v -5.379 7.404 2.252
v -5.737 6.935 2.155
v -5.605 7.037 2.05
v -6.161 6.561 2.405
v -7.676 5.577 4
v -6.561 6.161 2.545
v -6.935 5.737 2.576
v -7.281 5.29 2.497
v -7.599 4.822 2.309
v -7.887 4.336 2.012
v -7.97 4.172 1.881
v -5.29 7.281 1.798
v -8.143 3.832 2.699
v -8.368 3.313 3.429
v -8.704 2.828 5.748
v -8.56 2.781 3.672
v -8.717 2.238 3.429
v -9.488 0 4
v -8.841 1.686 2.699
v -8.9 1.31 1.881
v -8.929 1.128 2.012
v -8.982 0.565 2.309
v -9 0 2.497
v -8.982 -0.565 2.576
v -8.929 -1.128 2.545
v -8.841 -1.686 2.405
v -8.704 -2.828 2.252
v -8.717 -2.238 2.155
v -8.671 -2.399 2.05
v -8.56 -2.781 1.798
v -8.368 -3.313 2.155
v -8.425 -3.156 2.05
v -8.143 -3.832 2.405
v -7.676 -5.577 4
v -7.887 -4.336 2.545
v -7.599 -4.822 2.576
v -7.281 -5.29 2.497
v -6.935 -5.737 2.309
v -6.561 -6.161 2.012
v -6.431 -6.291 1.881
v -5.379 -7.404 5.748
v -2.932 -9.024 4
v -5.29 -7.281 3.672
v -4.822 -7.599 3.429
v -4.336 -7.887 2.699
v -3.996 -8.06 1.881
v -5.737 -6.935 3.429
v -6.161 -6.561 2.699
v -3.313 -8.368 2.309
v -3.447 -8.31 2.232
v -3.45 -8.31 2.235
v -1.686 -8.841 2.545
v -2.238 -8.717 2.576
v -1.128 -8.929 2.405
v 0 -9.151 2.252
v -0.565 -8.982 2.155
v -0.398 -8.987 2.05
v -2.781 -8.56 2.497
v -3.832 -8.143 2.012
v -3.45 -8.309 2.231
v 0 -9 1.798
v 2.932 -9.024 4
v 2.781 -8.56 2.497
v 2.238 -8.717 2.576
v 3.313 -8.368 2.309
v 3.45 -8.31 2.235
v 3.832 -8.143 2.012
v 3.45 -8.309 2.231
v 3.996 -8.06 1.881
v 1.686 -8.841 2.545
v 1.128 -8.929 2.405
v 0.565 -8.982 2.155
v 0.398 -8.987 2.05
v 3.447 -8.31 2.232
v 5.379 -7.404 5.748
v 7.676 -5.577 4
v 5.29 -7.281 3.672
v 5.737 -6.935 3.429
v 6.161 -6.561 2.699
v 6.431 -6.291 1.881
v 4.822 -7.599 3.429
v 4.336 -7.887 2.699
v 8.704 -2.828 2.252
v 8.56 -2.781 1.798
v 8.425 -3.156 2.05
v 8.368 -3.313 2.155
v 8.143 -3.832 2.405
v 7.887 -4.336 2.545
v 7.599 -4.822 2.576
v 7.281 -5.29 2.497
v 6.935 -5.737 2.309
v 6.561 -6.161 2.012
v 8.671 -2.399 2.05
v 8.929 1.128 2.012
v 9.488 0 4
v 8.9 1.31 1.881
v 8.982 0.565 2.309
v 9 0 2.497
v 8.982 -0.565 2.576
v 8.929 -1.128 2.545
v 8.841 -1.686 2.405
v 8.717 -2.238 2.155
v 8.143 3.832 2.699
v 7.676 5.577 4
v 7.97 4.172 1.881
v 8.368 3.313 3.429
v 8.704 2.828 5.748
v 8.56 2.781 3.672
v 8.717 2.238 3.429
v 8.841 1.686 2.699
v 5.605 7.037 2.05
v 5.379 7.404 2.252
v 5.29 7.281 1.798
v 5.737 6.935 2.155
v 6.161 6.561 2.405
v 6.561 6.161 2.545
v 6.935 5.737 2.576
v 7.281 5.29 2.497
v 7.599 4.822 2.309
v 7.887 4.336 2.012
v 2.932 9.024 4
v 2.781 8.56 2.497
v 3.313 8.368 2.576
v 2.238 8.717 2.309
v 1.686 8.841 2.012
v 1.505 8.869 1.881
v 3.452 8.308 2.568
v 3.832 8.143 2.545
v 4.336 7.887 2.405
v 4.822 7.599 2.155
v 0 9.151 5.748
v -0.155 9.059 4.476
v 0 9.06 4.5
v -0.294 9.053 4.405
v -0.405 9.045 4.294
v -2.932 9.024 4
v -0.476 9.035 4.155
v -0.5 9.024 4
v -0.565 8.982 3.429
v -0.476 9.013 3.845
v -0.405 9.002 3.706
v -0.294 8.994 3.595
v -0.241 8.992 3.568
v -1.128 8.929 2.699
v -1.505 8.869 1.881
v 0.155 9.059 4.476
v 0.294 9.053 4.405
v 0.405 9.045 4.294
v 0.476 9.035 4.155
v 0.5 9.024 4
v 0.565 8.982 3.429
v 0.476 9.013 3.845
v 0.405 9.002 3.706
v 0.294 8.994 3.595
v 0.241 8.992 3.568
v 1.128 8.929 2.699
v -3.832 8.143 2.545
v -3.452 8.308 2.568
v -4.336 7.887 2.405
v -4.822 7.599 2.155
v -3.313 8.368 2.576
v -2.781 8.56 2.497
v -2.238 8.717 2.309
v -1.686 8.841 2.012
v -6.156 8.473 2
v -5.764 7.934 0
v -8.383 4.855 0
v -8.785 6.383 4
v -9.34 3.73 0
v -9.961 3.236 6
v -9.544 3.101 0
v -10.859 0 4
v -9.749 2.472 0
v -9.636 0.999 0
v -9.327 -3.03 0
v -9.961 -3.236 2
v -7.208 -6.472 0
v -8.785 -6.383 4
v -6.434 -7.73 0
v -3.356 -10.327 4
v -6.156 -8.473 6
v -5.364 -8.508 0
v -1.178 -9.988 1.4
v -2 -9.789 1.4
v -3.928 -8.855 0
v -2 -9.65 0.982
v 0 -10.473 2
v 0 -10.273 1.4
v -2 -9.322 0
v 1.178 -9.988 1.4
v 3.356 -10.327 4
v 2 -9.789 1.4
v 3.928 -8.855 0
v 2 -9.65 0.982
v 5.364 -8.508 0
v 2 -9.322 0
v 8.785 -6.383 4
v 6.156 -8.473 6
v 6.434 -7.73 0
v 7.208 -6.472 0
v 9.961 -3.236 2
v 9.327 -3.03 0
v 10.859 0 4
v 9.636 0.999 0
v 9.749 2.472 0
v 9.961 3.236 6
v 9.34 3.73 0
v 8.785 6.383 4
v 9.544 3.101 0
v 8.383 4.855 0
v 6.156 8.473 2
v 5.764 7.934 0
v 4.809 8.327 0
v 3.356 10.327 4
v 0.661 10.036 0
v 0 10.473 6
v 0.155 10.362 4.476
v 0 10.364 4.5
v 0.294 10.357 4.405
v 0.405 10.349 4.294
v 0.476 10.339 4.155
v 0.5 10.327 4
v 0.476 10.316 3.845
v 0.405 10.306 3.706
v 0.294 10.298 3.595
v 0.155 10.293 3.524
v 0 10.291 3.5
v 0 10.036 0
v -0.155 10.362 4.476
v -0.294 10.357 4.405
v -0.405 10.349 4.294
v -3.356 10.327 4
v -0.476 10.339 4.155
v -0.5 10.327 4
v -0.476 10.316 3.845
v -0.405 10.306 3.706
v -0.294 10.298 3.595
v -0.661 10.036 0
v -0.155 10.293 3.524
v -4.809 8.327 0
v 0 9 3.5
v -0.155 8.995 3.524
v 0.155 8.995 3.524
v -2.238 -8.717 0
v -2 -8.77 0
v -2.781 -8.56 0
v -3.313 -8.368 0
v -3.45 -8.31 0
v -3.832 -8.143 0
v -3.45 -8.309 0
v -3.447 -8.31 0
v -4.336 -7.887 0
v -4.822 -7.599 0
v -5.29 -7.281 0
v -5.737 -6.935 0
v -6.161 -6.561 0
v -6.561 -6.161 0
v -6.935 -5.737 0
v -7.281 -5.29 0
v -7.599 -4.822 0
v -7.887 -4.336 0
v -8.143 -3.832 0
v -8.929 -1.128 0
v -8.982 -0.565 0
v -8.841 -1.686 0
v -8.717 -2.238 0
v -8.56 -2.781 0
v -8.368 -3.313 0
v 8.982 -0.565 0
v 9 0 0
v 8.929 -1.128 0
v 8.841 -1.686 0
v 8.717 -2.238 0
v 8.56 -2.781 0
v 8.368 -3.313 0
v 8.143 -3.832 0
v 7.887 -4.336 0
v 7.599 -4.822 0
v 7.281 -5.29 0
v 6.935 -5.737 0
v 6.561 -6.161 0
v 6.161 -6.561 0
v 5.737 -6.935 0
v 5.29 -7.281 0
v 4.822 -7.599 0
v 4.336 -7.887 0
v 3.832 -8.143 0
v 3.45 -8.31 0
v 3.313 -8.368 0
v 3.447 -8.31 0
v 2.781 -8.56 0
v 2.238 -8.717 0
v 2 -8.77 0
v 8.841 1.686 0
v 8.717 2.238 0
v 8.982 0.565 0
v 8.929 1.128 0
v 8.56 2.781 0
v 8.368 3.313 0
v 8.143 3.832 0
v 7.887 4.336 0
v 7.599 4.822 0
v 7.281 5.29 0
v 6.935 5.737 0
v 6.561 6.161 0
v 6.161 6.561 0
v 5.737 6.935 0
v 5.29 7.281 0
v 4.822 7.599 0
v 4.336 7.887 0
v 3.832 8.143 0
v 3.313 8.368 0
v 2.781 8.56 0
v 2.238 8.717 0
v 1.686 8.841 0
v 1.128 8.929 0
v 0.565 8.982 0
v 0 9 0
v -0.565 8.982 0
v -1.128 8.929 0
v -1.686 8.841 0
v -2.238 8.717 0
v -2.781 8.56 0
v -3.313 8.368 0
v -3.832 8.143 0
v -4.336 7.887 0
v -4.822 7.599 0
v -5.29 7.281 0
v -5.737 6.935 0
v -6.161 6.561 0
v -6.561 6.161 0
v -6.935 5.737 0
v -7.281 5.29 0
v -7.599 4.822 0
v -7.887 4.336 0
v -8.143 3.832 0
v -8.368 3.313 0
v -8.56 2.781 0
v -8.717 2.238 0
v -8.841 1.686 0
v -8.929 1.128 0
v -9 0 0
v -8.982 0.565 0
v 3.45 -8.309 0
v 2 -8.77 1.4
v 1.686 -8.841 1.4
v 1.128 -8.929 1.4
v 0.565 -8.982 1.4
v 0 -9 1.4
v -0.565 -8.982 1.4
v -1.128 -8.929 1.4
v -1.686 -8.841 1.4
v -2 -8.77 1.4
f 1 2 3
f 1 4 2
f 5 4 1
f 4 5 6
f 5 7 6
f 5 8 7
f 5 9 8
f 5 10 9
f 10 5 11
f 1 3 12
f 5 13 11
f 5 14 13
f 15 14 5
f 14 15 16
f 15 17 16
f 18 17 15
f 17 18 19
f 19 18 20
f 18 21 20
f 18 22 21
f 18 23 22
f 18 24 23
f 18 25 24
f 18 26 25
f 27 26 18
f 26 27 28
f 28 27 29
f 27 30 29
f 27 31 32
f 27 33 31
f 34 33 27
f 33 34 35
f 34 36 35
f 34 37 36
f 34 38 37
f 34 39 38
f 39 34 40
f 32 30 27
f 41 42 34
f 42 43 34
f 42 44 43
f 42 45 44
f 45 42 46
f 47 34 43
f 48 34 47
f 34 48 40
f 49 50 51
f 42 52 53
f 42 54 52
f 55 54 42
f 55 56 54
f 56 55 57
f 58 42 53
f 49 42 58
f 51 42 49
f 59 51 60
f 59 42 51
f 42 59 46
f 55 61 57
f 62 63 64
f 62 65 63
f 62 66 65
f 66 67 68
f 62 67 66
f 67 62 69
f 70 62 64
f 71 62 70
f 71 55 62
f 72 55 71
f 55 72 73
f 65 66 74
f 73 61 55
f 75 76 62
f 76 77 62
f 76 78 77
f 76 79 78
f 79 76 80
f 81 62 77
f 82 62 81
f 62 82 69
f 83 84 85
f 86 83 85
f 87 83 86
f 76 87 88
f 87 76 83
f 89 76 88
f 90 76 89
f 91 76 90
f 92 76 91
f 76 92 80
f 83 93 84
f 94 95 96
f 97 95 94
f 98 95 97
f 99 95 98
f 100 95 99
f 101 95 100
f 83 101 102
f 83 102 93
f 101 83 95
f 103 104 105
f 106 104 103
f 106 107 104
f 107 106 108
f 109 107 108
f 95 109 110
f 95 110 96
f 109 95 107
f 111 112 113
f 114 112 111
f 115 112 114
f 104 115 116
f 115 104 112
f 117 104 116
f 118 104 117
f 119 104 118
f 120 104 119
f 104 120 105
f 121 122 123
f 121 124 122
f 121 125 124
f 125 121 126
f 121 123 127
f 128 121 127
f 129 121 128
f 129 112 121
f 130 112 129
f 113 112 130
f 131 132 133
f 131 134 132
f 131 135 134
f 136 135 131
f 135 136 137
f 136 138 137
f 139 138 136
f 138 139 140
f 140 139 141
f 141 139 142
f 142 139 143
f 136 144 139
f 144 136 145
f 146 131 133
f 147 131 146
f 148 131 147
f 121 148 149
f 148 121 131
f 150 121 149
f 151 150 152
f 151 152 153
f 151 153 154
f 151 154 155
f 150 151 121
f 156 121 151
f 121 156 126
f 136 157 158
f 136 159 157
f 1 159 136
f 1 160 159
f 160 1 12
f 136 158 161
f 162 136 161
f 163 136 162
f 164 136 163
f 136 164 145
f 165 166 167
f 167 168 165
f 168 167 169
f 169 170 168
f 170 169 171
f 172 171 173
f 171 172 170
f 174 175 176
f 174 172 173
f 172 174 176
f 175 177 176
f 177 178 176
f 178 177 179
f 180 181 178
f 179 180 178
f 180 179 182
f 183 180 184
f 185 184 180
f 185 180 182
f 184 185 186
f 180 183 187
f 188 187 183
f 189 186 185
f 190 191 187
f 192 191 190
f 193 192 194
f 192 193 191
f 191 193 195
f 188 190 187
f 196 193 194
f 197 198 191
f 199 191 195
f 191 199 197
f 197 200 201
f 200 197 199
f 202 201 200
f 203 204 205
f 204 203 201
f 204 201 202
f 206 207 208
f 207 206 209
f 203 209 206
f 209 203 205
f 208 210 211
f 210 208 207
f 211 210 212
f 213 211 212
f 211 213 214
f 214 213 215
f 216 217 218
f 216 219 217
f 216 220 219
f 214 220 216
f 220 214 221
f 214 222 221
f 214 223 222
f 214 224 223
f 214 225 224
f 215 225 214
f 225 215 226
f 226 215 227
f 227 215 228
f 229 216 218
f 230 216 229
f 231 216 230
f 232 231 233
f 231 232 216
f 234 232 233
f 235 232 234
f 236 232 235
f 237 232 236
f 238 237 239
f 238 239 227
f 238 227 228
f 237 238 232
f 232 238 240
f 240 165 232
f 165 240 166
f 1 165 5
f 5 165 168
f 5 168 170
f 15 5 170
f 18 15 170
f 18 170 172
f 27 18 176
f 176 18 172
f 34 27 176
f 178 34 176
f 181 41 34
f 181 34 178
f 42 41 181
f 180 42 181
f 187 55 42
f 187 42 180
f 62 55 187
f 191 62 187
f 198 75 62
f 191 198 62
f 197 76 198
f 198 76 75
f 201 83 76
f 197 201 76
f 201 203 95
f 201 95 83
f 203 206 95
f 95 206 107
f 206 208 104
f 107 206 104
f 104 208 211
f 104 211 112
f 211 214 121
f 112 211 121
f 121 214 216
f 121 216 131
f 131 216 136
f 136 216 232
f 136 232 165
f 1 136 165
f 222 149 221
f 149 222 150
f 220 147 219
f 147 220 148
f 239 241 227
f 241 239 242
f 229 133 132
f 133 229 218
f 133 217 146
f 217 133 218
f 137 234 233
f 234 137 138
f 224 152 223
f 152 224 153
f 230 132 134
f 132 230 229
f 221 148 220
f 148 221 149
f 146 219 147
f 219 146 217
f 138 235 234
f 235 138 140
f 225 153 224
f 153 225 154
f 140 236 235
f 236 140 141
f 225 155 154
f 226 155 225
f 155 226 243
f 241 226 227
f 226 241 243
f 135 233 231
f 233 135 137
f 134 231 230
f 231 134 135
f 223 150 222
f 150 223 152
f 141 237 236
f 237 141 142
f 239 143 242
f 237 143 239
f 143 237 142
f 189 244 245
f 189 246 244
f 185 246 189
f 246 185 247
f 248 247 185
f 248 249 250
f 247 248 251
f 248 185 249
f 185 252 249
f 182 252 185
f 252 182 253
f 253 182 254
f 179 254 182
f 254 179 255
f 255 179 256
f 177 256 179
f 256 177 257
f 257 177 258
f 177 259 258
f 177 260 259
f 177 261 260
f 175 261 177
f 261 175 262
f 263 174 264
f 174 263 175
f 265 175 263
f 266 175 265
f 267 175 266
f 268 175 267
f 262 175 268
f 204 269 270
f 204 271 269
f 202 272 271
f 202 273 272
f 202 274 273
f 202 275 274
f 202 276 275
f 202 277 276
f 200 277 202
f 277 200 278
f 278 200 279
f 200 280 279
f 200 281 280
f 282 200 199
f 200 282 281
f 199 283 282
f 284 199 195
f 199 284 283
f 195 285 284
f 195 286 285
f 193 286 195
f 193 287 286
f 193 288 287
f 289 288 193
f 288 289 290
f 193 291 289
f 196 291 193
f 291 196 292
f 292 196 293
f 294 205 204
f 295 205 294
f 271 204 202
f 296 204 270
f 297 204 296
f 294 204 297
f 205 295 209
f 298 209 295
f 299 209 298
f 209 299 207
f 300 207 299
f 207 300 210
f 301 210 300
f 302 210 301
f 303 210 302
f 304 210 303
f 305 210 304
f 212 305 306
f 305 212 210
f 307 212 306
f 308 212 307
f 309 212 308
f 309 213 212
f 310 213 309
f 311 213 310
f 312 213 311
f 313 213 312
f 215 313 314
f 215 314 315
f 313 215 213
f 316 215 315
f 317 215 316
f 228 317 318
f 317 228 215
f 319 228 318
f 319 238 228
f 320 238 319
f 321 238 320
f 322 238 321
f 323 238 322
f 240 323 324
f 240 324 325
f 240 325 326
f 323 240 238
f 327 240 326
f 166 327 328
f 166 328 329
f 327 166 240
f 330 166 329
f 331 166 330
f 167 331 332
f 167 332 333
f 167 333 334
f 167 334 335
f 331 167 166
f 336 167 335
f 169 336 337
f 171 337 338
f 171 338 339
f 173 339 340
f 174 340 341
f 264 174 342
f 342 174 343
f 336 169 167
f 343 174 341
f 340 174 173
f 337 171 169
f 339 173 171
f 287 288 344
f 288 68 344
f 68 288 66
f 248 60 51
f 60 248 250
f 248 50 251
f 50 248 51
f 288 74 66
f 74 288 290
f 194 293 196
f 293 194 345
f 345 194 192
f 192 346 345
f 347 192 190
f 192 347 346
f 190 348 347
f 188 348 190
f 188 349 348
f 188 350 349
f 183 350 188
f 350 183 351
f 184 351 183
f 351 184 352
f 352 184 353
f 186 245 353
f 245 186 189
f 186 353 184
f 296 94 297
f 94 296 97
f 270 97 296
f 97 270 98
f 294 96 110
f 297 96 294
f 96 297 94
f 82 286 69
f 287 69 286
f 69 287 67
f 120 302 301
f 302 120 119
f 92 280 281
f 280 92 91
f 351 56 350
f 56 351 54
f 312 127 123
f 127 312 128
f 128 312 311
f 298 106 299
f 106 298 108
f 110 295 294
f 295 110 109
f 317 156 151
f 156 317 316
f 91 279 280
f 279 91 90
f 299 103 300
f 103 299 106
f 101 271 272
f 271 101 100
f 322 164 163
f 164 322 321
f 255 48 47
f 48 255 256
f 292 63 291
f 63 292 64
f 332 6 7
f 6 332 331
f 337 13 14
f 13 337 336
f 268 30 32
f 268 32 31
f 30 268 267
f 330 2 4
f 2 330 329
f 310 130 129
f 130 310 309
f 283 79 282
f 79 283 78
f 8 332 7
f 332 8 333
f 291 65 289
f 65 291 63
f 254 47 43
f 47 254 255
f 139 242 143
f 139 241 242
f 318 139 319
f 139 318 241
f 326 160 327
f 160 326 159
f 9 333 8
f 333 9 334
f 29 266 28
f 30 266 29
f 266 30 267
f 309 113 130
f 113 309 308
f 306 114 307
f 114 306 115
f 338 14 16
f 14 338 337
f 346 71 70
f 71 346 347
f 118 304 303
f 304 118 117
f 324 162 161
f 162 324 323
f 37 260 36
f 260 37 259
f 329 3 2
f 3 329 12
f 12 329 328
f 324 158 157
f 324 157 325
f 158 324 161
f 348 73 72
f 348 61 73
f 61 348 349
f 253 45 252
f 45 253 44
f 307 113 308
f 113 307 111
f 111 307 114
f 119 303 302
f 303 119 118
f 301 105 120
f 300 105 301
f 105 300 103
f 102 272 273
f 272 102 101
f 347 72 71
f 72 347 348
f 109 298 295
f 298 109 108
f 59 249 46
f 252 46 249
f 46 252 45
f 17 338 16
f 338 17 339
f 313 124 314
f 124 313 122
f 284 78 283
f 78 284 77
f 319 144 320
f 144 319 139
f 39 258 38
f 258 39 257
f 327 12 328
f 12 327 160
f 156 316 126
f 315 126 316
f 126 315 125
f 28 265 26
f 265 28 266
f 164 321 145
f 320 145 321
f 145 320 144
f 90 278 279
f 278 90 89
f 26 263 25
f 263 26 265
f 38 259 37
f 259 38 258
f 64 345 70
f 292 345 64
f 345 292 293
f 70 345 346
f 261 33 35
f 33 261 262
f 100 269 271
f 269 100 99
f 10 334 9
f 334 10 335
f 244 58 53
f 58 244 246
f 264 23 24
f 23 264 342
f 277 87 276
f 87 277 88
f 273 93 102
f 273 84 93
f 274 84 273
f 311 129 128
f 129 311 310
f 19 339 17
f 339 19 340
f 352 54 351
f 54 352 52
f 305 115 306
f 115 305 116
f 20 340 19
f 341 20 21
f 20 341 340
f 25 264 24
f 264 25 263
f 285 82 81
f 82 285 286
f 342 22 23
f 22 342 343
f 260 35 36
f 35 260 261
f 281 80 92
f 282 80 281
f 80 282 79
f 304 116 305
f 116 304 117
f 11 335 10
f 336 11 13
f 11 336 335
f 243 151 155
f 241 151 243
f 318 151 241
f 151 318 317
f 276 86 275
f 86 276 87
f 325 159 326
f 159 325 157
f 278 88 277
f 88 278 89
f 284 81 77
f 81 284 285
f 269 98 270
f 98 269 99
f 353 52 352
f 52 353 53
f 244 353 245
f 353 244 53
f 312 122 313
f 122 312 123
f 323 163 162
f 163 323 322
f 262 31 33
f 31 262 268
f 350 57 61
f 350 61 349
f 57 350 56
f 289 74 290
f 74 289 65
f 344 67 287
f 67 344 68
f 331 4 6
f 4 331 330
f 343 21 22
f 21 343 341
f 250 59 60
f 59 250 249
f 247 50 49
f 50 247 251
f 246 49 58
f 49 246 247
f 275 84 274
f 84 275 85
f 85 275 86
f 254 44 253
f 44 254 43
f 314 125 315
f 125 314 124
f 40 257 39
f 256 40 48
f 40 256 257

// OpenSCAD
// file: driver.scad
function snub(xmin, ymin, xmax, ymax, d) = [ [xmax, ymax-d], [xmax, ymin+d], [xmax-d, ymin], [xmin+d, ymin], [xmin, ymin+d], [xmin, ymax-d], [xmin+d, ymax], [xmax-d, ymax] ];

BOTTOM_THICKNESS = .8;
D = .01;

//DRIVER_PCB_SHAPE = [ [6,4], [4,6], [-4,6], [-6,4], [-6, -4], [-4, -6], [4, -6], [6, -4] ];
DRIVER_KEEPOUT_SHAPE = snub(-6.2, -6.2, 6.2, 6.2, 2);
DRIVER_WALL_SHAPE = snub(-7.2, -7.2, 7.2, 7.2, 2);


DRIVER_PCB_SHAPE = snub(-6, -6, 6, 6, 2);
DRIVER_CLAMP_SHAPE = [ [-5.4-D, 5], [5.4+D, 5], [4.2+D, 6.2+D], [-4.2-D, 6.2+D] ];
DRIVER_ISP_KEEPOUT = snub(-5, -.5, 3, 4.5, .5);//		-3, -4.5, 5, .5, .5);
DRIVER_STANDOFF_1 = [ [-1.7, -6.2-D], [-1.7, -4.5], [-2.8, -4.5], [-2.8, -6.2-D] ] ;
DRIVER_STANDOFF_2 = [ [ 1.7, -6.2-D], [ 1.7, -4.5], [ 2.8, -4.5], [ 2.8, -6.2-D] ] ;


module driver_cutout()
{
	difference()
	{
		union()
		{	
			translate([0,0,BOTTOM_THICKNESS])
				linear_extrude(5)
					polygon(DRIVER_KEEPOUT_SHAPE);
			translate([0,0,-D])
				linear_extrude(5)
					polygon(DRIVER_ISP_KEEPOUT);
			driver_isp_hole();
		}
		driver_standoffs();
	}
}

module driver_standoffs()
{
	translate([0,0,BOTTOM_THICKNESS-D])
		linear_extrude(2+D)
		{
				polygon(DRIVER_CLAMP_SHAPE);
				polygon(DRIVER_STANDOFF_1);
				polygon(DRIVER_STANDOFF_2);
		}
}

module driver_wall(w)
{
	difference ()
	{
		translate([0,0,BOTTOM_THICKNESS-D])
			linear_extrude(3+D)
				polygon(snub(-6.2-w, -6.2-w, 6.2+w, 6.2+w, 2));
		translate([0,0,BOTTOM_THICKNESS-D-D])
			linear_extrude(3+D+D+D)
				polygon([ [-4.2, -5], [4.2, -5], [4.2, -8], [-4.2, -8] ]);
	}
}

module driver_isp_hole()
{
	translate([0,0,-100])
		linear_extrude(105)
			polygon(DRIVER_ISP_KEEPOUT);
}


module driver_positive(w)
{
	driver_wall(w);
	driver_standoffs();
}

difference()
{
	union()
	{
		cylinder(r=12.5, h=1.2);
		driver_positive(1);
	}
	driver_cutout();
}
// file: switch.scad
module switch_cutout()
{
	translate ([ 0, 0, .69 ])
		union ()
		{
			cube(size=[6.9,3,5], center=true);
			translate ([0,-2.4,0])
				cube(size=[4,5,1.42], center=true);
		}
}

switch_cutout();
// file: eggshell20mm.scad
module eggshell20mm()
{
	rotate ([0,0,18])
		polyhedron( points = [ [4.575706e+00, 3.324445e+00, -7.403649e+00], [6.529766e+00, 4.744153e+00, -4.988298e+00], [8.706355e+00, -0.000000e+00, -4.353178e+00], [4.988298e+00, 0.000000e+00, -8.071235e+00], [0.000000e+00, 0.000000e+00, -9.734001e+00], [1.541469e+00, 4.744153e+00, -8.071235e+00], [-1.747764e+00, 5.379066e+00, -7.403649e+00], [-4.035618e+00, 2.932048e+00, -8.071235e+00], [-7.043589e+00, 5.117467e+00, -4.353178e+00], [-2.494149e+00, 7.676201e+00, -4.988298e+00], [-2.827942e+00, 8.703511e+00, -1.747764e+00], [-5.577086e+00, 7.676201e+00, -0.000000e+00], [-7.403649e+00, 5.379066e+00, 1.747764e+00], [-9.023915e+00, 2.932048e+00, 8.881784e-16], [-9.151413e+00, 0.000000e+00, -1.747764e+00], [-8.071235e+00, 0.000000e+00, -4.988298e+00], [-5.655884e+00, 0.000000e+00, -7.403649e+00], [-4.035618e+00, -2.932048e+00, -8.071235e+00], [-7.043589e+00, -5.117467e+00, -4.353178e+00], [-9.023915e+00, -2.932048e+00, 8.881784e-16], [-7.403649e+00, -5.379066e+00, 1.747764e+00], [-5.577086e+00, -7.676201e+00, -0.000000e+00], [-2.827942e+00, -8.703511e+00, -1.747764e+00], [-2.494149e+00, -7.676201e+00, -4.988298e+00], [-1.747764e+00, -5.379066e+00, -7.403649e+00], [1.541469e+00, -4.744153e+00, -8.071235e+00], [2.690412e+00, -8.280236e+00, -4.353178e+00], [0.000000e+00, -9.488306e+00, -0.000000e+00], [2.827942e+00, -8.703511e+00, 1.747764e+00], [5.577086e+00, -7.676201e+00, -0.000000e+00], [7.403649e+00, -5.379066e+00, -1.747764e+00], [6.529766e+00, -4.744153e+00, -4.988298e+00], [4.575706e+00, -3.324445e+00, -7.403649e+00], [9.023915e+00, -2.932048e+00, -8.881784e-16], [9.151413e+00, -0.000000e+00, 1.747764e+00], [9.023915e+00, 2.932048e+00, -8.881784e-16], [7.403649e+00, 5.379066e+00, -1.747764e+00], [2.690412e+00, 8.280236e+00, -4.353178e+00], [5.577086e+00, 7.676201e+00, -0.000000e+00], [2.827942e+00, 8.703511e+00, 1.747764e+00], [-0.000000e+00, 9.488306e+00, -0.000000e+00], [5.236642e+00, 3.804643e+00, -8.473064e+00], [7.472955e+00, 5.429420e+00, -5.708830e+00], [9.963940e+00, -0.000000e+00, -4.981970e+00], [5.708830e+00, 0.000000e+00, -9.237080e+00], [-8.881784e-16, 0.000000e+00, -1.114002e+01], [1.764125e+00, 5.429420e+00, -9.237080e+00], [-2.000219e+00, 6.156042e+00, -8.473064e+00], [-4.618540e+00, 3.355566e+00, -9.237080e+00], [-8.060997e+00, 5.856657e+00, -4.981970e+00], [-2.854415e+00, 8.784985e+00, -5.708830e+00], [-3.236423e+00, 9.960685e+00, -2.000219e+00], [-6.382665e+00, 8.784985e+00, -0.000000e+00], [-8.473064e+00, 6.156042e+00, 2.000219e+00], [-1.032737e+01, 3.355566e+00, 8.881784e-16], [-1.047328e+01, 0.000000e+00, -2.000219e+00], [-9.237080e+00, 0.000000e+00, -5.708830e+00], [-6.472845e+00, 0.000000e+00, -8.473064e+00], [-4.618540e+00, -3.355566e+00, -9.237080e+00], [-8.060997e+00, -5.856657e+00, -4.981970e+00], [-1.032737e+01, -3.355566e+00, 8.881784e-16], [-8.473064e+00, -6.156042e+00, 2.000219e+00], [-6.382665e+00, -8.784985e+00, -0.000000e+00], [-3.236423e+00, -9.960685e+00, -2.000219e+00], [-2.854415e+00, -8.784985e+00, -5.708830e+00], [-2.000219e+00, -6.156042e+00, -8.473064e+00], [1.764125e+00, -5.429420e+00, -9.237080e+00], [3.079027e+00, -9.476270e+00, -4.981970e+00], [0.000000e+00, -1.085884e+01, -0.000000e+00], [3.236423e+00, -9.960685e+00, 2.000219e+00], [6.382665e+00, -8.784985e+00, -0.000000e+00], [8.473064e+00, -6.156042e+00, -2.000219e+00], [7.472955e+00, -5.429420e+00, -5.708830e+00], [5.236642e+00, -3.804643e+00, -8.473064e+00], [1.032737e+01, -3.355566e+00, -8.881784e-16], [1.047328e+01, -0.000000e+00, 2.000219e+00], [1.032737e+01, 3.355566e+00, -8.881784e-16], [8.473064e+00, 6.156042e+00, -2.000219e+00], [3.079027e+00, 9.476270e+00, -4.981970e+00], [6.382665e+00, 8.784985e+00, -0.000000e+00], [3.236423e+00, 9.960685e+00, 2.000219e+00], [-0.000000e+00, 1.085884e+01, -0.000000e+00] ], faces = [ [ 1, 2, 3, 0 ] , [ 3, 4, 5, 0 ] , [ 5, 4, 7, 6 ] , [ 7, 8, 9, 6 ] , [ 9, 8, 11, 10 ] , [ 11, 8, 13, 12 ] , [ 13, 8, 15, 14 ] , [ 15, 8, 7, 16 ] , [ 7, 4, 17, 16 ] , [ 17, 18, 15, 16 ] , [ 15, 18, 19, 14 ] , [ 19, 18, 21, 20 ] , [ 21, 18, 23, 22 ] , [ 23, 18, 17, 24 ] , [ 17, 4, 25, 24 ] , [ 25, 26, 23, 24 ] , [ 23, 26, 27, 22 ] , [ 27, 26, 29, 28 ] , [ 29, 26, 31, 30 ] , [ 31, 26, 25, 32 ] , [ 25, 4, 3, 32 ] , [ 3, 2, 31, 32 ] , [ 31, 2, 33, 30 ] , [ 33, 2, 35, 34 ] , [ 35, 2, 1, 36 ] , [ 1, 37, 38, 36 ] , [ 38, 37, 40, 39 ] , [ 40, 37, 9, 10 ] , [ 9, 37, 5, 6 ] , [ 5, 37, 1, 0 ] , [ 44, 43, 42, 41 ] , [ 46, 45, 44, 41 ] , [ 48, 45, 46, 47 ] , [ 50, 49, 48, 47 ] , [ 52, 49, 50, 51 ] , [ 54, 49, 52, 53 ] , [ 56, 49, 54, 55 ] , [ 48, 49, 56, 57 ] , [ 58, 45, 48, 57 ] , [ 56, 59, 58, 57 ] , [ 60, 59, 56, 55 ] , [ 62, 59, 60, 61 ] , [ 64, 59, 62, 63 ] , [ 58, 59, 64, 65 ] , [ 66, 45, 58, 65 ] , [ 64, 67, 66, 65 ] , [ 68, 67, 64, 63 ] , [ 70, 67, 68, 69 ] , [ 72, 67, 70, 71 ] , [ 66, 67, 72, 73 ] , [ 44, 45, 66, 73 ] , [ 72, 43, 44, 73 ] , [ 74, 43, 72, 71 ] , [ 76, 43, 74, 75 ] , [ 42, 43, 76, 77 ] , [ 79, 78, 42, 77 ] , [ 81, 78, 79, 80 ] , [ 50, 78, 81, 51 ] , [ 46, 78, 50, 47 ] , [ 42, 78, 46, 41 ] , [ 52, 51, 10, 11 ] , [ 53, 52, 11, 12 ] , [ 54, 53, 12, 13 ] , [ 55, 54, 13, 14 ] , [ 60, 55, 14, 19 ] , [ 61, 60, 19, 20 ] , [ 62, 61, 20, 21 ] , [ 63, 62, 21, 22 ] , [ 68, 63, 22, 27 ] , [ 69, 68, 27, 28 ] , [ 70, 69, 28, 29 ] , [ 71, 70, 29, 30 ] , [ 74, 71, 30, 33 ] , [ 75, 74, 33, 34 ] , [ 76, 75, 34, 35 ] , [ 77, 76, 35, 36 ] , [ 79, 77, 36, 38 ] , [ 80, 79, 38, 39 ] , [ 81, 80, 39, 40 ] , [ 51, 81, 40, 10 ]  ], convexity = 10);

}


eggshell20mm();
// main file
use <eggshell20mm.scad>
use <switch.scad>
use <driver.scad>

SWITCH_POS = [0,-6.81,0];
DRIVER_POS = [0,1.4,0];

module cutouts()
{
	union ()
	{
		translate(SWITCH_POS)
			switch_cutout();
		//translate (DRIVER_POS)
			//rotate([0,0,90])
				//driver_cutout(); 
                translate([0,0,-.1]) cylinder(r = 9, h=10, $fn=100);
	}
}

	difference()
	{
		translate([0,0,4])
		{
			intersection()
			{
				cube( size = [30, 30, 8], center=true );
				difference()
				{
					eggshell20mm();
					translate ([0,10,0])
						rotate([90,0,0])
							cylinder(r = .5, h=6, $fn=20, center=true);
				}
			}
		}
		cutouts();
	}


render();
